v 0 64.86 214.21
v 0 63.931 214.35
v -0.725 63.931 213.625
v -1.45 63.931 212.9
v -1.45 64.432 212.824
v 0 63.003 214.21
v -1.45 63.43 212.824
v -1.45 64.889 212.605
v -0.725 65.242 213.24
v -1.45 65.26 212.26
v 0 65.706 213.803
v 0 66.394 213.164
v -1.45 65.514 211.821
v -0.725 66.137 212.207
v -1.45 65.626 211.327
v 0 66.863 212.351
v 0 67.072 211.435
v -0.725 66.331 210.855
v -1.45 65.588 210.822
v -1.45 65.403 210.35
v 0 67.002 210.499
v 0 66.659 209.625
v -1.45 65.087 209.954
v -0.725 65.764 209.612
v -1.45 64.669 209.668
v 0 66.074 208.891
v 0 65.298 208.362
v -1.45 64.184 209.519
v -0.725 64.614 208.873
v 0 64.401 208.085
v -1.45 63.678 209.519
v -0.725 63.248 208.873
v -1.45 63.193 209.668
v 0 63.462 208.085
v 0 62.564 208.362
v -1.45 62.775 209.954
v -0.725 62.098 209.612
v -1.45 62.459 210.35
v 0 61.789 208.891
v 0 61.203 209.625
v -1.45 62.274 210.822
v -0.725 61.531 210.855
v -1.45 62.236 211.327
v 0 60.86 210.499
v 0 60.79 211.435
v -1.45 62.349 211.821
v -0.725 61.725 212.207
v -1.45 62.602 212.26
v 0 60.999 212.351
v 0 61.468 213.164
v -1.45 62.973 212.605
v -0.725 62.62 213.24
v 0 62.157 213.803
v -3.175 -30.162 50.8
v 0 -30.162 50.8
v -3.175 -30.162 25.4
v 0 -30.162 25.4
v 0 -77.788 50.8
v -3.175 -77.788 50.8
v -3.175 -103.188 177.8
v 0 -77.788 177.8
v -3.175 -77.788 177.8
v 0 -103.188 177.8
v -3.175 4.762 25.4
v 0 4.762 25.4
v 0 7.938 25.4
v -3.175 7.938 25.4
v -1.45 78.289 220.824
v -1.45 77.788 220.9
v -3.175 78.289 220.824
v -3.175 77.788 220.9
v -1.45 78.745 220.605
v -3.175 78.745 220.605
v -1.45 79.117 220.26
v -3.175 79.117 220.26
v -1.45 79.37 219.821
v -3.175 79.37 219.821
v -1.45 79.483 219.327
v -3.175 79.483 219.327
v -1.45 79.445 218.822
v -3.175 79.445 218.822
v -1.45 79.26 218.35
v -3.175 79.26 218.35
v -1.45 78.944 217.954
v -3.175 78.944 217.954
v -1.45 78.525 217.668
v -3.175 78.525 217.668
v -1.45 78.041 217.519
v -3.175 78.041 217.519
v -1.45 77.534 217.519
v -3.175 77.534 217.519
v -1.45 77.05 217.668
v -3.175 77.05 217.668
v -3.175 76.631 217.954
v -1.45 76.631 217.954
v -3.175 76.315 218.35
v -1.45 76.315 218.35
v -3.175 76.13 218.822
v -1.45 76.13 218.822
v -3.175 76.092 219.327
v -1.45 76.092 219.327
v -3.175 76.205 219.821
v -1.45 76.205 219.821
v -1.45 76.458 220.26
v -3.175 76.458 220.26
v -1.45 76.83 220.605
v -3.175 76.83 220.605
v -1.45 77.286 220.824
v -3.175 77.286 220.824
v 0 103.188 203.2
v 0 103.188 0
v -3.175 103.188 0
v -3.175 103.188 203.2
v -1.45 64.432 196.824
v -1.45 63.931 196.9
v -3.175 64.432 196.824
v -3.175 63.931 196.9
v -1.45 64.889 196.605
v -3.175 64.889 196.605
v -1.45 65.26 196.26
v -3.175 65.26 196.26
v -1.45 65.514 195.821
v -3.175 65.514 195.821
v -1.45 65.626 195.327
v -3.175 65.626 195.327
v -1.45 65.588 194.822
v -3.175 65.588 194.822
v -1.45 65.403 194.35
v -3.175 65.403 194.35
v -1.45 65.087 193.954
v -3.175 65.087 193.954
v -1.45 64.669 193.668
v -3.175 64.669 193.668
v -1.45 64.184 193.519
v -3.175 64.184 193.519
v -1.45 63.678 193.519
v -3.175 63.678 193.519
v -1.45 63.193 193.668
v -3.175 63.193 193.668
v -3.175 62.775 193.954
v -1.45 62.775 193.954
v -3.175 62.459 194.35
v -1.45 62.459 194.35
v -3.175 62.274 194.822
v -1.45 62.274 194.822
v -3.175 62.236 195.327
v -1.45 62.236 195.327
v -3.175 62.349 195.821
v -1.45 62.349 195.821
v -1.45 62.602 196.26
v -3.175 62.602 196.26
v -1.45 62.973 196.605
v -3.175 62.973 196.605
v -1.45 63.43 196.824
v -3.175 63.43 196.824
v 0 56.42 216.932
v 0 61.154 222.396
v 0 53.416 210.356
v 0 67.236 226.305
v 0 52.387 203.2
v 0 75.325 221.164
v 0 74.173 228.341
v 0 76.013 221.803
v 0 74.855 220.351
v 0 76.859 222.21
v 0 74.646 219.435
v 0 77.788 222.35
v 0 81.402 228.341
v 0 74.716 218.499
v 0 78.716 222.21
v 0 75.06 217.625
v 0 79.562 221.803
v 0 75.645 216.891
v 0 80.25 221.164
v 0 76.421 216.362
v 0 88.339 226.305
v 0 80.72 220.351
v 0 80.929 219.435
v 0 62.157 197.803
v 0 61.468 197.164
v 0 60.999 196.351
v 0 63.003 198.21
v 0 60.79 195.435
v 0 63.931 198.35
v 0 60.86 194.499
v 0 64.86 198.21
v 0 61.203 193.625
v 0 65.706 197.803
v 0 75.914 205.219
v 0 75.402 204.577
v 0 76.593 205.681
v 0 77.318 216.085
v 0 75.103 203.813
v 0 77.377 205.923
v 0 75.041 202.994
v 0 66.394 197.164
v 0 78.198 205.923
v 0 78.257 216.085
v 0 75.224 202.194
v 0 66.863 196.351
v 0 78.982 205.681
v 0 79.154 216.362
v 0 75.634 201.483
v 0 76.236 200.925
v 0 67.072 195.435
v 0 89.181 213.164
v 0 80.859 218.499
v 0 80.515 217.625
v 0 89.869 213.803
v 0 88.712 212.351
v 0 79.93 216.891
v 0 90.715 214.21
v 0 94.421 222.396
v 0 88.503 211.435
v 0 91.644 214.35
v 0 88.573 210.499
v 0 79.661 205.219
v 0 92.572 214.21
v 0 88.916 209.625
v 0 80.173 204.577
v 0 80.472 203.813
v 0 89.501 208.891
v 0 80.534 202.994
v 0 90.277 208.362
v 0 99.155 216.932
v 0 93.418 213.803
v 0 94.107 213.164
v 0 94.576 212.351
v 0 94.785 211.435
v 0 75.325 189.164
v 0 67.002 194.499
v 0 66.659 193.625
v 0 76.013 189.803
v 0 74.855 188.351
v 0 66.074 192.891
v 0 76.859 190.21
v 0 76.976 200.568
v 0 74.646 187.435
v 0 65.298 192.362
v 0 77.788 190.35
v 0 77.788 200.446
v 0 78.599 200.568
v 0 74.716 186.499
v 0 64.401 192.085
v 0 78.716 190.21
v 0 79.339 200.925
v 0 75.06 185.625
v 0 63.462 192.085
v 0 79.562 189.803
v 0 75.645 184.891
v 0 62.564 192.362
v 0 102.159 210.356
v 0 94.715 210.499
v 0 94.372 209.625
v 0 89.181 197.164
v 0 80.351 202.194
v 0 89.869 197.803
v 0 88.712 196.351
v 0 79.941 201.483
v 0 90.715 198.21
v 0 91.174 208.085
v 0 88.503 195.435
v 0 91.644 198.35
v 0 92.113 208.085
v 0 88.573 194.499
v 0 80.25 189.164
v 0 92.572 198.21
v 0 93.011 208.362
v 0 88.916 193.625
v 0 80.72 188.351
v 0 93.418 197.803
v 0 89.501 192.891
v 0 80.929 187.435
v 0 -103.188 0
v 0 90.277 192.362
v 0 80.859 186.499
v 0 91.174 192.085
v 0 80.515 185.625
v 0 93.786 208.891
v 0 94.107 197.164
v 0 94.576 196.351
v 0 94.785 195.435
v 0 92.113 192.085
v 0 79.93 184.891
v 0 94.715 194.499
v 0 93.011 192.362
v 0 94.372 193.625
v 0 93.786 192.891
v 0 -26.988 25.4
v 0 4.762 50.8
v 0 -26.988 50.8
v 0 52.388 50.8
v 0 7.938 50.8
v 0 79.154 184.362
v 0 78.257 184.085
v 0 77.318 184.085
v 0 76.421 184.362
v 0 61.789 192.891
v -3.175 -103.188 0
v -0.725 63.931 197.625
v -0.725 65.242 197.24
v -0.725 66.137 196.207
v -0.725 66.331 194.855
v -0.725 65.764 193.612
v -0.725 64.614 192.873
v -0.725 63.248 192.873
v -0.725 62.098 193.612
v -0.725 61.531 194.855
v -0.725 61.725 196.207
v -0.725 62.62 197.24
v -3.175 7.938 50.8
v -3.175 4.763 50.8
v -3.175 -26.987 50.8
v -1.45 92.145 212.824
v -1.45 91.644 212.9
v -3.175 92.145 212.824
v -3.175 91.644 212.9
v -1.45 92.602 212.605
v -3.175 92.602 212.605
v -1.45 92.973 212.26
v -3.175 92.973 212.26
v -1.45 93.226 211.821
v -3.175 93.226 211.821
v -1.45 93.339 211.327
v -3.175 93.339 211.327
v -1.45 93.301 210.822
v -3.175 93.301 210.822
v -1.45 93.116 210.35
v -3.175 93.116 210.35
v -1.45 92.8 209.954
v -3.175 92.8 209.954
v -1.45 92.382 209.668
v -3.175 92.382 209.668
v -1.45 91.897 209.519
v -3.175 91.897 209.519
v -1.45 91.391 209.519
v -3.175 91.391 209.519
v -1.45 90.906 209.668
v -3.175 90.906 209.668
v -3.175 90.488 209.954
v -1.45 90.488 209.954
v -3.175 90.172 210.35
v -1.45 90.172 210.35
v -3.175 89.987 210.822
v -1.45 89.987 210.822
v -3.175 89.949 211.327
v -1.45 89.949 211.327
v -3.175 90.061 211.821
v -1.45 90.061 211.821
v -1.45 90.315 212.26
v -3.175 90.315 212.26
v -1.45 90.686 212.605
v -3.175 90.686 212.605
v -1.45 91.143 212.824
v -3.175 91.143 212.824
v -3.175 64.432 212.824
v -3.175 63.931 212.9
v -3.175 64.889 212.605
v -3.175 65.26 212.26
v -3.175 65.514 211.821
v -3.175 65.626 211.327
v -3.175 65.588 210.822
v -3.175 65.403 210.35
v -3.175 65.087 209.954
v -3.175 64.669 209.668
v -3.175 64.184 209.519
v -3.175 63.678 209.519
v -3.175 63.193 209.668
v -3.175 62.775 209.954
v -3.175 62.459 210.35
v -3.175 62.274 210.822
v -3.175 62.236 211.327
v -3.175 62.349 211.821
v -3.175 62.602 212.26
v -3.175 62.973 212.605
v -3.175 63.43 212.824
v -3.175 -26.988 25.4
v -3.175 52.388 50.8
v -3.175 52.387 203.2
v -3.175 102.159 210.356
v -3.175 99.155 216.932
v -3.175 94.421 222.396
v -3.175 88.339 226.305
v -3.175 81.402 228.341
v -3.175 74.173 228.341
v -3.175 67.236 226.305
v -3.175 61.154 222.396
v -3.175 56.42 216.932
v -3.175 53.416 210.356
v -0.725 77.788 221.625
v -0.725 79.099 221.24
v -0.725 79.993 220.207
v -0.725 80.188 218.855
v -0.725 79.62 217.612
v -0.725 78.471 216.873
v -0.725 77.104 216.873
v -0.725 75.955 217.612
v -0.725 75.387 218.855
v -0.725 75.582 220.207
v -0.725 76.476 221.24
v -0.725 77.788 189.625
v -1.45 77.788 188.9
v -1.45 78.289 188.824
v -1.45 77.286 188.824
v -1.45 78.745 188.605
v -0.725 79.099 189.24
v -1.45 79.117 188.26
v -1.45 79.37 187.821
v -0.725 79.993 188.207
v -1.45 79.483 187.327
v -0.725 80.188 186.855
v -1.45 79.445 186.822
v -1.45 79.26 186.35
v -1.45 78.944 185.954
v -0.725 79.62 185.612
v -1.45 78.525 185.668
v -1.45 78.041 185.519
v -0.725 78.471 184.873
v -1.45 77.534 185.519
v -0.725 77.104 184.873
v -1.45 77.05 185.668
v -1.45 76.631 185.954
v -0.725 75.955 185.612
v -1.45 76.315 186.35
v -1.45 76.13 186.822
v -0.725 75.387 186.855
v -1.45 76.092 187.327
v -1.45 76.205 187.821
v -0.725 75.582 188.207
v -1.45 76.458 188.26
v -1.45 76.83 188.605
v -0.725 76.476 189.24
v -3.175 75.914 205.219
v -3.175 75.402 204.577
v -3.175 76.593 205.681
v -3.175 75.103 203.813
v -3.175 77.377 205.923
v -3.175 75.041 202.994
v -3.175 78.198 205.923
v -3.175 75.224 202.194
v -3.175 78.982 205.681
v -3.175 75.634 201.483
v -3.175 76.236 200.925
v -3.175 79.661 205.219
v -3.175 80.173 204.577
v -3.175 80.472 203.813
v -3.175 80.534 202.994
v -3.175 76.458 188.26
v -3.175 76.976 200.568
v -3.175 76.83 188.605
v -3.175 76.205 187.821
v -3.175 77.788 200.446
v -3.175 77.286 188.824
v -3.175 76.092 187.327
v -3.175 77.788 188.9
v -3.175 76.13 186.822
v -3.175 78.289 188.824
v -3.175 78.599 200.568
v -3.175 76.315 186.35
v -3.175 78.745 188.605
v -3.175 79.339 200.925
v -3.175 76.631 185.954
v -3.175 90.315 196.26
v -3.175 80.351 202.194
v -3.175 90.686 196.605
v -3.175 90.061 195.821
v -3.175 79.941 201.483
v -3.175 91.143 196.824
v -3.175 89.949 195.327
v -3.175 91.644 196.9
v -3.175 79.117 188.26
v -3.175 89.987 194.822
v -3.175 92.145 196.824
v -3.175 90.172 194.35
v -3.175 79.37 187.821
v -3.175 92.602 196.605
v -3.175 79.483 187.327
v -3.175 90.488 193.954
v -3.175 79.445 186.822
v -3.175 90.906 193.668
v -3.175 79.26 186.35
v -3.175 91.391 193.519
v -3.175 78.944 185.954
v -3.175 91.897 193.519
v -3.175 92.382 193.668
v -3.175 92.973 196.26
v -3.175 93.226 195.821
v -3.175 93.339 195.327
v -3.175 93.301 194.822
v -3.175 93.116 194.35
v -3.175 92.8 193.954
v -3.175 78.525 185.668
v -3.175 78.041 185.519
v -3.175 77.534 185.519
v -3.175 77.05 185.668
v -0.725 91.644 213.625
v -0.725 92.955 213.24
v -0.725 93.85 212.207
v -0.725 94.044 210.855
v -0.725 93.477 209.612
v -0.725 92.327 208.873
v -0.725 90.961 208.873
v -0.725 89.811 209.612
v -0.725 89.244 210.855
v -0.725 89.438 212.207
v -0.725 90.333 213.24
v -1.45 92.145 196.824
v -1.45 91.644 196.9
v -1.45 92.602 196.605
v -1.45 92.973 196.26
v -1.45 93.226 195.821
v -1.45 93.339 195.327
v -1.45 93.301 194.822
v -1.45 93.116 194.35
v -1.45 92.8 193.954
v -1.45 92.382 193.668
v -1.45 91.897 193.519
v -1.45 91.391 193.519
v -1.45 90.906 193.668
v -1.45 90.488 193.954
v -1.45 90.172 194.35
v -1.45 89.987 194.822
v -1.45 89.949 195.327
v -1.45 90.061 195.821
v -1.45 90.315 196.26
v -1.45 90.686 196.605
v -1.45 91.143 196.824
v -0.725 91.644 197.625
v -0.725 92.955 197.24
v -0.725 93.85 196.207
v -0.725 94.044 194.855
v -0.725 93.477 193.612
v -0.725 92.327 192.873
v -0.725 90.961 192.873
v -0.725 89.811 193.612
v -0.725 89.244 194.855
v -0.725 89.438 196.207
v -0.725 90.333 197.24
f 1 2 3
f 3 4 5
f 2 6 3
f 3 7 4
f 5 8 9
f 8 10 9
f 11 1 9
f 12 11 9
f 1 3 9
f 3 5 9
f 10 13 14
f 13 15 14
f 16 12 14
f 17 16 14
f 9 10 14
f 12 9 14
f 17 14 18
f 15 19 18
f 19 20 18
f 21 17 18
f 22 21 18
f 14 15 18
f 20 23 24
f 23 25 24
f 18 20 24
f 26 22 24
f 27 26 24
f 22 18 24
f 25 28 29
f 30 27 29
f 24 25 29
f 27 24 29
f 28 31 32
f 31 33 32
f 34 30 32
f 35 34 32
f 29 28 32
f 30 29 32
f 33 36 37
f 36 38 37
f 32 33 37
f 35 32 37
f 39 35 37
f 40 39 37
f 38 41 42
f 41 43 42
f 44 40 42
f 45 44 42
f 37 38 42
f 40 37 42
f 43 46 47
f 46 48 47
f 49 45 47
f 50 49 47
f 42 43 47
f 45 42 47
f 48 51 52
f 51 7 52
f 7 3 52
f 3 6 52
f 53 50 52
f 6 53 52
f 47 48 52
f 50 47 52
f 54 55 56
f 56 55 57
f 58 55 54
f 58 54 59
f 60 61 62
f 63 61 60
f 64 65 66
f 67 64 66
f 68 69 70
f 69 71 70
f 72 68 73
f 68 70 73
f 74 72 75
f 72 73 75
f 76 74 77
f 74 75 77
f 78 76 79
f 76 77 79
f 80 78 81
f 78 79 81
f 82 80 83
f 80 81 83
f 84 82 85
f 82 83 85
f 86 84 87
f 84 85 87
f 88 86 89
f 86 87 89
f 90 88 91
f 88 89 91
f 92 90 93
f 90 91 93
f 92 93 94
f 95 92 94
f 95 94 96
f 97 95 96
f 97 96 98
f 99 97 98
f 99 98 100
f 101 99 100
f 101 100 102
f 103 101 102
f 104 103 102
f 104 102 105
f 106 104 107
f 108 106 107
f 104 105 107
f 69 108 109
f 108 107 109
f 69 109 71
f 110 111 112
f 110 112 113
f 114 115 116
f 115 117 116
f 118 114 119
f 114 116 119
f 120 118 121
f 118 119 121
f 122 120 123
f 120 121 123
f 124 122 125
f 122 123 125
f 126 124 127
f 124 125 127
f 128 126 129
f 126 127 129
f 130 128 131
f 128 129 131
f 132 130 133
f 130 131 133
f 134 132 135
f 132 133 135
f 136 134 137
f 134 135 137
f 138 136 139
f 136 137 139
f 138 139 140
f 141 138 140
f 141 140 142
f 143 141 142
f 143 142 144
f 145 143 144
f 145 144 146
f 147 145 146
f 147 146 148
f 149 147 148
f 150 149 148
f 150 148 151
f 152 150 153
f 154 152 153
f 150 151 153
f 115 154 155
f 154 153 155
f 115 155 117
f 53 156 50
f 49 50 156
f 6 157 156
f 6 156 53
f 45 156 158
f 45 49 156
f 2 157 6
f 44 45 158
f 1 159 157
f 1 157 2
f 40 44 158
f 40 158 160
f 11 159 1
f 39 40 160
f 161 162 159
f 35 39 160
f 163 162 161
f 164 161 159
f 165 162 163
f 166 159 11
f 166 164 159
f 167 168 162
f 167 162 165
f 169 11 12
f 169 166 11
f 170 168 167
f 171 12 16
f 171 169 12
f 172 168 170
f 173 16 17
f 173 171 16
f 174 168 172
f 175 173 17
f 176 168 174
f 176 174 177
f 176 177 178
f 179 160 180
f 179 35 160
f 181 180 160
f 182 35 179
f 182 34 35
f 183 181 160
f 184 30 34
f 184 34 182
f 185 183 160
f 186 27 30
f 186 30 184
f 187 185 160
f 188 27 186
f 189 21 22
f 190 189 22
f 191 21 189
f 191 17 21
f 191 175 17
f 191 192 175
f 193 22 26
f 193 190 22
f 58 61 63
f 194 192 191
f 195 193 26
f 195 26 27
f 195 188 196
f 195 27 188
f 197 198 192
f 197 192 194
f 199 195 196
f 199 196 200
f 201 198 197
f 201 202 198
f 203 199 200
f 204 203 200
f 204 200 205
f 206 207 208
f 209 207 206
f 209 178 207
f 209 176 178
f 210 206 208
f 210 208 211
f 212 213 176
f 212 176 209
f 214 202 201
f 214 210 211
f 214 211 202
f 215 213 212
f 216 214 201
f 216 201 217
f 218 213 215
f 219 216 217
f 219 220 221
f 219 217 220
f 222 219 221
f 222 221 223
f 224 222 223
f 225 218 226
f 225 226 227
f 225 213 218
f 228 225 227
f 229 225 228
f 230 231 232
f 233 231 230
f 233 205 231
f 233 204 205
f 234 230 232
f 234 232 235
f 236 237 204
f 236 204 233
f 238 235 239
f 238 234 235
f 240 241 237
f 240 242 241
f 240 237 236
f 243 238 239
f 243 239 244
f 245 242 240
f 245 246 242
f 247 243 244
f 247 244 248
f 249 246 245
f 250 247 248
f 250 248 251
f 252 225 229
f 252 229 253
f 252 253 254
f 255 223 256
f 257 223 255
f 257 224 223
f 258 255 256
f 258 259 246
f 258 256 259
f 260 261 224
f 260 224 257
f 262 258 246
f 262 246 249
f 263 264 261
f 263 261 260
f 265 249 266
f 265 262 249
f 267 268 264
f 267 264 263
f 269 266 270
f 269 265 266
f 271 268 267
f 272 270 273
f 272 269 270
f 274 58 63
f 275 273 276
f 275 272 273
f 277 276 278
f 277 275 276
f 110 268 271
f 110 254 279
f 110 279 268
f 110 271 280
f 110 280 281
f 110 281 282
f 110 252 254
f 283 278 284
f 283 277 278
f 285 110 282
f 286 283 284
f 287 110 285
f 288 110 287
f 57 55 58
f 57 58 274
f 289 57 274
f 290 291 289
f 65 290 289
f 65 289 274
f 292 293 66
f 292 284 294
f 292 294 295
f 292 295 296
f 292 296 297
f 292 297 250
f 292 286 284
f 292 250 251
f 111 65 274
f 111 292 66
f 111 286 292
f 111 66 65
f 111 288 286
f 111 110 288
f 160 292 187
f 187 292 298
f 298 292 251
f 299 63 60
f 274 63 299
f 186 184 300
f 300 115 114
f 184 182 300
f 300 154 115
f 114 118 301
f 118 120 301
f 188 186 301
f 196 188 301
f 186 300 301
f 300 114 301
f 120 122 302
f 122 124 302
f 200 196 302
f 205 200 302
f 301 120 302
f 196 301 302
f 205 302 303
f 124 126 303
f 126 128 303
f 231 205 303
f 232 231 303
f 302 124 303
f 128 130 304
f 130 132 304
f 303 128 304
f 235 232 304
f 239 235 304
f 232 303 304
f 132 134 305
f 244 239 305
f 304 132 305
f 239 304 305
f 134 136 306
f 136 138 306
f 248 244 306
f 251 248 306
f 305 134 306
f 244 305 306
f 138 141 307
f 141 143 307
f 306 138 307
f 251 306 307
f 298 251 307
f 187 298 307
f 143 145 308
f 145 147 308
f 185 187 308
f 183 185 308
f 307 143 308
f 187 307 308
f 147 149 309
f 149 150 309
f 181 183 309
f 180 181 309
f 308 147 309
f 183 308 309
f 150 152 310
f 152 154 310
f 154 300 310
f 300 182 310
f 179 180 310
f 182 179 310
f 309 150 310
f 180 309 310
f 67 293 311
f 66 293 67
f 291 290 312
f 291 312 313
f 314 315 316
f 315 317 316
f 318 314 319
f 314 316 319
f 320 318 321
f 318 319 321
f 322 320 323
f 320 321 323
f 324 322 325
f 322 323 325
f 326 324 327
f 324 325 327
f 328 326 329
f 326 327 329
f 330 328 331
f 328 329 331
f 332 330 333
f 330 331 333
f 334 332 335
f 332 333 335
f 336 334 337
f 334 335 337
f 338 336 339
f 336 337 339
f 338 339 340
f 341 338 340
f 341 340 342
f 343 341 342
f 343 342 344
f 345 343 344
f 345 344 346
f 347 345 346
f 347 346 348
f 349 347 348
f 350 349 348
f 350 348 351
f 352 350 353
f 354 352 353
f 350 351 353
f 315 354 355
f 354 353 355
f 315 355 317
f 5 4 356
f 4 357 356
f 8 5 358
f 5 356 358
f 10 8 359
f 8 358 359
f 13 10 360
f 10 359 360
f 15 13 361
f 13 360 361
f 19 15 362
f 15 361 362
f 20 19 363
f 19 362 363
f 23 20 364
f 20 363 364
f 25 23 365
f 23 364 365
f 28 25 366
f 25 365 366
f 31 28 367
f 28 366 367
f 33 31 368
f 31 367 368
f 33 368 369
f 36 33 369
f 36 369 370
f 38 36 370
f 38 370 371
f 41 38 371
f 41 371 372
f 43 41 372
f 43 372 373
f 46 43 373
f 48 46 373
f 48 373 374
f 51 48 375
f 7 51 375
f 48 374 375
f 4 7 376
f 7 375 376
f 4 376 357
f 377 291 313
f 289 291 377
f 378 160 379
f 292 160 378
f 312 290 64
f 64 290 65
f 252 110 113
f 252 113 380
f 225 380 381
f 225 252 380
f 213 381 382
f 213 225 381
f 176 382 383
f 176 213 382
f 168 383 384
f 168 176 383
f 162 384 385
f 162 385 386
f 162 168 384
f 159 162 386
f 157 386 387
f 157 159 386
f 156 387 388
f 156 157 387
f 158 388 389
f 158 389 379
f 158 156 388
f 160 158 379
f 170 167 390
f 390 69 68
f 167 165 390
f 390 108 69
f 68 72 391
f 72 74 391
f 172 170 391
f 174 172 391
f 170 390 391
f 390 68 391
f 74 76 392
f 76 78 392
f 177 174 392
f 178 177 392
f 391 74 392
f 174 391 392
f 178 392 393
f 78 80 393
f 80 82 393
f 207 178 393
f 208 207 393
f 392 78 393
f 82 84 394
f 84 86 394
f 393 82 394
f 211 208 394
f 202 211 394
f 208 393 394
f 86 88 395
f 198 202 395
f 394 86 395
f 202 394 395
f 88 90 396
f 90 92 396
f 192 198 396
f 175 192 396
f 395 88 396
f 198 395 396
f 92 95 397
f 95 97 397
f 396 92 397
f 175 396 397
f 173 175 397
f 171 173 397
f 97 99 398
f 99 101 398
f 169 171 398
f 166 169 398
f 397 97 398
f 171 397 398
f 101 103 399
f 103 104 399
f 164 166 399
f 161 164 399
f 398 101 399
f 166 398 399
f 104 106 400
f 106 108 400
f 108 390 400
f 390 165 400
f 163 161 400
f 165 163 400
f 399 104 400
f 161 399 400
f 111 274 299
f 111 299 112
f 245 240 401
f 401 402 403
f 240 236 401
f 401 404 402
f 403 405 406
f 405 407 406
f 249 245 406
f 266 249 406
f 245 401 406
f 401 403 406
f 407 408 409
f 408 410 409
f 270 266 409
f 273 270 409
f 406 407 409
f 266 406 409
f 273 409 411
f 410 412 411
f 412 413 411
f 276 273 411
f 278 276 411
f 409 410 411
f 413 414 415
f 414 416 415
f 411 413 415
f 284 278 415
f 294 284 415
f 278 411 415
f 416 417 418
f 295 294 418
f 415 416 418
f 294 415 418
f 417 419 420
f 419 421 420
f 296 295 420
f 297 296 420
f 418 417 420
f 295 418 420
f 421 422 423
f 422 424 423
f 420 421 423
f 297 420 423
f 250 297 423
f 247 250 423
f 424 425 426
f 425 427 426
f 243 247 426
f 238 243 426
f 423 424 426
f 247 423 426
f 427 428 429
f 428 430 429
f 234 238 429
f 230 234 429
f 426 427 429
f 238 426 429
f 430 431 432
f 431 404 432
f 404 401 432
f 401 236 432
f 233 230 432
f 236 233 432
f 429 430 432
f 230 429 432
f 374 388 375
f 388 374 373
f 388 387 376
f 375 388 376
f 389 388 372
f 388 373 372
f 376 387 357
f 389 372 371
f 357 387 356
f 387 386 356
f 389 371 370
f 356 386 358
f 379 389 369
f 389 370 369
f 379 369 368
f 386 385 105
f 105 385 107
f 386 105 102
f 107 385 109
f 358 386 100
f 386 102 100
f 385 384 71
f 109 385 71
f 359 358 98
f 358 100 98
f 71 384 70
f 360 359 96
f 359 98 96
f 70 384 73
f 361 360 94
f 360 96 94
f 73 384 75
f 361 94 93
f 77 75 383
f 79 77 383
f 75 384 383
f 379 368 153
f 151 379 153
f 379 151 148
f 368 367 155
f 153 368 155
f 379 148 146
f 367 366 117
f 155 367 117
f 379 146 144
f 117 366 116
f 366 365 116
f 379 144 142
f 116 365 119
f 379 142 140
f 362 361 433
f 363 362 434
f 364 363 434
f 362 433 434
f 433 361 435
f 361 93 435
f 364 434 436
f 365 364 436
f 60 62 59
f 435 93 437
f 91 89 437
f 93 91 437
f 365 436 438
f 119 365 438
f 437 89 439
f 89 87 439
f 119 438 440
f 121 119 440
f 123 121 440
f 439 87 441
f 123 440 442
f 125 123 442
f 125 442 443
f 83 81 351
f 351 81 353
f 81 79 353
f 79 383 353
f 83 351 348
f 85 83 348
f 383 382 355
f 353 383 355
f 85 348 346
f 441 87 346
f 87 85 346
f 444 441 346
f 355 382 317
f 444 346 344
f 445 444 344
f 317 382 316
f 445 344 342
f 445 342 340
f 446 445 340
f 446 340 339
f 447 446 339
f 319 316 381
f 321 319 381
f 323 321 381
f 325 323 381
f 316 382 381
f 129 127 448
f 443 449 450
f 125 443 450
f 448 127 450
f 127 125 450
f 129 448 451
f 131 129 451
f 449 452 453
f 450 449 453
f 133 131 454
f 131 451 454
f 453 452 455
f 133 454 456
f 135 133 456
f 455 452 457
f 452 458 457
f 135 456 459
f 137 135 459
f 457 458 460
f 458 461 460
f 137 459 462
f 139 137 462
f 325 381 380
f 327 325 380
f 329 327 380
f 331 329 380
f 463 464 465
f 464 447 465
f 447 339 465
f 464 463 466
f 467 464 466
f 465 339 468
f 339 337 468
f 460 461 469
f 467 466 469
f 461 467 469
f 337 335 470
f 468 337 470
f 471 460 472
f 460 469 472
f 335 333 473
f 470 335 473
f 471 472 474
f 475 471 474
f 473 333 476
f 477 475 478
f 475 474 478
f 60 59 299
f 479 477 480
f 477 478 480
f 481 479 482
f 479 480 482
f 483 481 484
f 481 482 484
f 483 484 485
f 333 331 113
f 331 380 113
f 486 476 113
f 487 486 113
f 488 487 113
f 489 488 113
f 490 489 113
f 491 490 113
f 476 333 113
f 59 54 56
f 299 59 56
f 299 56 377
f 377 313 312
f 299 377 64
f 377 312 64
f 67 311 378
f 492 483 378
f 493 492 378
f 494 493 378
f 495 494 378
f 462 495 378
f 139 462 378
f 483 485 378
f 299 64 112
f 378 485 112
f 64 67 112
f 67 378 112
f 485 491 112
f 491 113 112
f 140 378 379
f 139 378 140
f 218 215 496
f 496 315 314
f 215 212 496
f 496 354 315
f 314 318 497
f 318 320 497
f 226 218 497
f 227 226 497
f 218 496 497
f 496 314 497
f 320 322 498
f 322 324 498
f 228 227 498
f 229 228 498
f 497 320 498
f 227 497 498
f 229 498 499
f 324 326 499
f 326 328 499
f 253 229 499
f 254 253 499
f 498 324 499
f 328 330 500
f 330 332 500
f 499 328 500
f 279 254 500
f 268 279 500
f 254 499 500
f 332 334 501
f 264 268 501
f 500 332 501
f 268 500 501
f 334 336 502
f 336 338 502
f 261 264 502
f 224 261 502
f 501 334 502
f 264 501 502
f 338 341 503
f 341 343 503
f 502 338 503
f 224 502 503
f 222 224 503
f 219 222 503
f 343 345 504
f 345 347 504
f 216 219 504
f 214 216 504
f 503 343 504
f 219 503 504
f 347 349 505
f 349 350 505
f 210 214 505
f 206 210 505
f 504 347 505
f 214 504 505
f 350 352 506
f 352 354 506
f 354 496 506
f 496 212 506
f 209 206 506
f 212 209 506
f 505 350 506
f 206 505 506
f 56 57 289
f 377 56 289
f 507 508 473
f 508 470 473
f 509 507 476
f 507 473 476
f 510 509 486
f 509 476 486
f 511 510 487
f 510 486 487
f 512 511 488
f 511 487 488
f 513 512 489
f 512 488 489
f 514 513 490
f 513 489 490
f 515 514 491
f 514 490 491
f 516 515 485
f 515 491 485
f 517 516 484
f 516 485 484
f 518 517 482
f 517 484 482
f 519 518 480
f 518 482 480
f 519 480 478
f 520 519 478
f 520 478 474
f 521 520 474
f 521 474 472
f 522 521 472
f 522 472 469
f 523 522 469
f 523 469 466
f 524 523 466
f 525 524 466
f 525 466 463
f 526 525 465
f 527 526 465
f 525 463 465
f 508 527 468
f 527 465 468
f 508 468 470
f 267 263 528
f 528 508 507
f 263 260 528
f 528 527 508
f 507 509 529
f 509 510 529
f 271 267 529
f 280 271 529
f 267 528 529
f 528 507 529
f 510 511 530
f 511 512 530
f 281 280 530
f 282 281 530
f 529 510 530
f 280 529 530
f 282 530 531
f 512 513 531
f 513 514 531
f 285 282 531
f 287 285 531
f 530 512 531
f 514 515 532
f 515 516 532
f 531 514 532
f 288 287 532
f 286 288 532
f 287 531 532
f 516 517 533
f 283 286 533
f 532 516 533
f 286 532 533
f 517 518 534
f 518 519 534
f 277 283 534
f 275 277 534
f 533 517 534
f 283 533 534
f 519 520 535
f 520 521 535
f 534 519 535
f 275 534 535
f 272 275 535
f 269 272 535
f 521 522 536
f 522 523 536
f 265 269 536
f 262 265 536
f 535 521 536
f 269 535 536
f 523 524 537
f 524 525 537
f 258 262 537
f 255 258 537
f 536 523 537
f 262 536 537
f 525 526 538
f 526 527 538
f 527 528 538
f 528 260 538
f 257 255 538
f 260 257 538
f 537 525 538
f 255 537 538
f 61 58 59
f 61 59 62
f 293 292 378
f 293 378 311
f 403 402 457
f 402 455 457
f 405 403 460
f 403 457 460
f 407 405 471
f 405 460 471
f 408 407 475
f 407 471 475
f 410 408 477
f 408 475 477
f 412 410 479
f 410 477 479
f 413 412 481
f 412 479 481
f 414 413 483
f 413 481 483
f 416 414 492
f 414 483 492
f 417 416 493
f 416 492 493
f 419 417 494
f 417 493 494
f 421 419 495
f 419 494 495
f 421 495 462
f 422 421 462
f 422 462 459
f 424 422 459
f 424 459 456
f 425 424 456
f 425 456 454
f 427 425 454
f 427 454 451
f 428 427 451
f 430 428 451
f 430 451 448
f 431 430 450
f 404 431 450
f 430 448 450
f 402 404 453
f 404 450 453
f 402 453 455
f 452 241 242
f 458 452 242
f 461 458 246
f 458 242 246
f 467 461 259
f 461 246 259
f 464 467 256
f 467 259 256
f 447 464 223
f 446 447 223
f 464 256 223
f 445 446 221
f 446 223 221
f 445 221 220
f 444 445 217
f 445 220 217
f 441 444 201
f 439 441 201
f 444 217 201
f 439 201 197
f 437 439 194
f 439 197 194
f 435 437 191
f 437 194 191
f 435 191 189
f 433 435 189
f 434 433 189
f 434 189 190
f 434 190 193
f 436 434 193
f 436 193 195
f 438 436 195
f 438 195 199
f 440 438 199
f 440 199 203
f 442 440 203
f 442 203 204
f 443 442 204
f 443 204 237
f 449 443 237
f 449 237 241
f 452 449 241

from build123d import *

# Parameters (mm, degrees)
BASE_FLANGE1_DEPTH                              = 3.175
SKETCH8_W                                       = 25.4
SKETCH8_H                                       = 3.175
CUT_EXTRUDE2_DEPTH                              = 251.830023684
SKETCH11_R                                      = 2.753999953
CUT_EXTRUDE4_DEPTH                              = 251.830023684
CSK_FOR_M3_FLAT_HEAD_MACHINE_SCREW1_D           = 3.4
CSK_FOR_M3_FLAT_HEAD_MACHINE_SCREW1_CSINK_D     = 6.3
CSK_FOR_M3_FLAT_HEAD_MACHINE_SCREW1_CSINK_ANGLE = 90


# Sheet-metal steps are written as plain solids
with BuildPart() as part:
    # Sketch1 → Base-Flange1 (new body)
    with BuildSketch(Plane(origin=(0, 0, 0), x_dir=(0, 0, -1), z_dir=(1, 0, 0))):
        with BuildLine():
            Line((0, -103.1875), (0, 103.1875))
            Line((0, 103.1875), (-203.2, 103.1875))
            ThreePointArc((-203.2, 103.1875), (-228.6, 77.7875), (-203.2, 52.3875))
            Line((-203.2, 52.3875), (-50.8, 52.3875))
            Line((-50.8, 52.3875), (-50.8, -77.7875))
            Line((-50.8, -77.7875), (-177.8, -77.7875))
            Line((-177.8, -77.7875), (-177.8, -103.1875))
            Line((-177.8, -103.1875), (-50.8, -103.1875))
            Line((-50.8, -103.1875), (0, -103.1875))
        make_face()
    extrude(amount=-BASE_FLANGE1_DEPTH)

    # Sketch8 → Cut-Extrude2 (cut, through all)
    with BuildSketch(Plane(origin=(0, 0, 0), x_dir=(0, 0, -1), z_dir=(1, 0, 0))):
        with Locations((-38.1, 6.35)):
            Rectangle(SKETCH8_W, SKETCH8_H)
        with Locations((-38.1, -28.575)):
            Rectangle(SKETCH8_W, SKETCH8_H)
    extrude(amount=-CUT_EXTRUDE2_DEPTH, mode=Mode.SUBTRACT)

    # Sketch11 → Cut-Extrude4 (cut, through all)
    with BuildSketch(Plane(origin=(0, 0, 0), x_dir=(0, 0, -1), z_dir=(1, 0, 0))):
        with Locations((-203.2, 77.7875)):
            Circle(SKETCH11_R)
    extrude(amount=-CUT_EXTRUDE4_DEPTH, mode=Mode.SUBTRACT)

    # CSK for M3 Flat Head Machine Screw1 (through all)
    with Locations(Plane(origin=(0, 0, 0), x_dir=(0, 0, -1), z_dir=(1, 0, 0))):
        with Locations((-211.2, 63.931093539), (-219.2, 77.7875), (-211.2, 91.643906461), (-195.2, 91.643906461), (-187.2, 77.7875), (-195.2, 63.931093539)):
            CounterSinkHole(CSK_FOR_M3_FLAT_HEAD_MACHINE_SCREW1_D / 2, CSK_FOR_M3_FLAT_HEAD_MACHINE_SCREW1_CSINK_D / 2, counter_sink_angle=CSK_FOR_M3_FLAT_HEAD_MACHINE_SCREW1_CSINK_ANGLE)


solid = part.part
